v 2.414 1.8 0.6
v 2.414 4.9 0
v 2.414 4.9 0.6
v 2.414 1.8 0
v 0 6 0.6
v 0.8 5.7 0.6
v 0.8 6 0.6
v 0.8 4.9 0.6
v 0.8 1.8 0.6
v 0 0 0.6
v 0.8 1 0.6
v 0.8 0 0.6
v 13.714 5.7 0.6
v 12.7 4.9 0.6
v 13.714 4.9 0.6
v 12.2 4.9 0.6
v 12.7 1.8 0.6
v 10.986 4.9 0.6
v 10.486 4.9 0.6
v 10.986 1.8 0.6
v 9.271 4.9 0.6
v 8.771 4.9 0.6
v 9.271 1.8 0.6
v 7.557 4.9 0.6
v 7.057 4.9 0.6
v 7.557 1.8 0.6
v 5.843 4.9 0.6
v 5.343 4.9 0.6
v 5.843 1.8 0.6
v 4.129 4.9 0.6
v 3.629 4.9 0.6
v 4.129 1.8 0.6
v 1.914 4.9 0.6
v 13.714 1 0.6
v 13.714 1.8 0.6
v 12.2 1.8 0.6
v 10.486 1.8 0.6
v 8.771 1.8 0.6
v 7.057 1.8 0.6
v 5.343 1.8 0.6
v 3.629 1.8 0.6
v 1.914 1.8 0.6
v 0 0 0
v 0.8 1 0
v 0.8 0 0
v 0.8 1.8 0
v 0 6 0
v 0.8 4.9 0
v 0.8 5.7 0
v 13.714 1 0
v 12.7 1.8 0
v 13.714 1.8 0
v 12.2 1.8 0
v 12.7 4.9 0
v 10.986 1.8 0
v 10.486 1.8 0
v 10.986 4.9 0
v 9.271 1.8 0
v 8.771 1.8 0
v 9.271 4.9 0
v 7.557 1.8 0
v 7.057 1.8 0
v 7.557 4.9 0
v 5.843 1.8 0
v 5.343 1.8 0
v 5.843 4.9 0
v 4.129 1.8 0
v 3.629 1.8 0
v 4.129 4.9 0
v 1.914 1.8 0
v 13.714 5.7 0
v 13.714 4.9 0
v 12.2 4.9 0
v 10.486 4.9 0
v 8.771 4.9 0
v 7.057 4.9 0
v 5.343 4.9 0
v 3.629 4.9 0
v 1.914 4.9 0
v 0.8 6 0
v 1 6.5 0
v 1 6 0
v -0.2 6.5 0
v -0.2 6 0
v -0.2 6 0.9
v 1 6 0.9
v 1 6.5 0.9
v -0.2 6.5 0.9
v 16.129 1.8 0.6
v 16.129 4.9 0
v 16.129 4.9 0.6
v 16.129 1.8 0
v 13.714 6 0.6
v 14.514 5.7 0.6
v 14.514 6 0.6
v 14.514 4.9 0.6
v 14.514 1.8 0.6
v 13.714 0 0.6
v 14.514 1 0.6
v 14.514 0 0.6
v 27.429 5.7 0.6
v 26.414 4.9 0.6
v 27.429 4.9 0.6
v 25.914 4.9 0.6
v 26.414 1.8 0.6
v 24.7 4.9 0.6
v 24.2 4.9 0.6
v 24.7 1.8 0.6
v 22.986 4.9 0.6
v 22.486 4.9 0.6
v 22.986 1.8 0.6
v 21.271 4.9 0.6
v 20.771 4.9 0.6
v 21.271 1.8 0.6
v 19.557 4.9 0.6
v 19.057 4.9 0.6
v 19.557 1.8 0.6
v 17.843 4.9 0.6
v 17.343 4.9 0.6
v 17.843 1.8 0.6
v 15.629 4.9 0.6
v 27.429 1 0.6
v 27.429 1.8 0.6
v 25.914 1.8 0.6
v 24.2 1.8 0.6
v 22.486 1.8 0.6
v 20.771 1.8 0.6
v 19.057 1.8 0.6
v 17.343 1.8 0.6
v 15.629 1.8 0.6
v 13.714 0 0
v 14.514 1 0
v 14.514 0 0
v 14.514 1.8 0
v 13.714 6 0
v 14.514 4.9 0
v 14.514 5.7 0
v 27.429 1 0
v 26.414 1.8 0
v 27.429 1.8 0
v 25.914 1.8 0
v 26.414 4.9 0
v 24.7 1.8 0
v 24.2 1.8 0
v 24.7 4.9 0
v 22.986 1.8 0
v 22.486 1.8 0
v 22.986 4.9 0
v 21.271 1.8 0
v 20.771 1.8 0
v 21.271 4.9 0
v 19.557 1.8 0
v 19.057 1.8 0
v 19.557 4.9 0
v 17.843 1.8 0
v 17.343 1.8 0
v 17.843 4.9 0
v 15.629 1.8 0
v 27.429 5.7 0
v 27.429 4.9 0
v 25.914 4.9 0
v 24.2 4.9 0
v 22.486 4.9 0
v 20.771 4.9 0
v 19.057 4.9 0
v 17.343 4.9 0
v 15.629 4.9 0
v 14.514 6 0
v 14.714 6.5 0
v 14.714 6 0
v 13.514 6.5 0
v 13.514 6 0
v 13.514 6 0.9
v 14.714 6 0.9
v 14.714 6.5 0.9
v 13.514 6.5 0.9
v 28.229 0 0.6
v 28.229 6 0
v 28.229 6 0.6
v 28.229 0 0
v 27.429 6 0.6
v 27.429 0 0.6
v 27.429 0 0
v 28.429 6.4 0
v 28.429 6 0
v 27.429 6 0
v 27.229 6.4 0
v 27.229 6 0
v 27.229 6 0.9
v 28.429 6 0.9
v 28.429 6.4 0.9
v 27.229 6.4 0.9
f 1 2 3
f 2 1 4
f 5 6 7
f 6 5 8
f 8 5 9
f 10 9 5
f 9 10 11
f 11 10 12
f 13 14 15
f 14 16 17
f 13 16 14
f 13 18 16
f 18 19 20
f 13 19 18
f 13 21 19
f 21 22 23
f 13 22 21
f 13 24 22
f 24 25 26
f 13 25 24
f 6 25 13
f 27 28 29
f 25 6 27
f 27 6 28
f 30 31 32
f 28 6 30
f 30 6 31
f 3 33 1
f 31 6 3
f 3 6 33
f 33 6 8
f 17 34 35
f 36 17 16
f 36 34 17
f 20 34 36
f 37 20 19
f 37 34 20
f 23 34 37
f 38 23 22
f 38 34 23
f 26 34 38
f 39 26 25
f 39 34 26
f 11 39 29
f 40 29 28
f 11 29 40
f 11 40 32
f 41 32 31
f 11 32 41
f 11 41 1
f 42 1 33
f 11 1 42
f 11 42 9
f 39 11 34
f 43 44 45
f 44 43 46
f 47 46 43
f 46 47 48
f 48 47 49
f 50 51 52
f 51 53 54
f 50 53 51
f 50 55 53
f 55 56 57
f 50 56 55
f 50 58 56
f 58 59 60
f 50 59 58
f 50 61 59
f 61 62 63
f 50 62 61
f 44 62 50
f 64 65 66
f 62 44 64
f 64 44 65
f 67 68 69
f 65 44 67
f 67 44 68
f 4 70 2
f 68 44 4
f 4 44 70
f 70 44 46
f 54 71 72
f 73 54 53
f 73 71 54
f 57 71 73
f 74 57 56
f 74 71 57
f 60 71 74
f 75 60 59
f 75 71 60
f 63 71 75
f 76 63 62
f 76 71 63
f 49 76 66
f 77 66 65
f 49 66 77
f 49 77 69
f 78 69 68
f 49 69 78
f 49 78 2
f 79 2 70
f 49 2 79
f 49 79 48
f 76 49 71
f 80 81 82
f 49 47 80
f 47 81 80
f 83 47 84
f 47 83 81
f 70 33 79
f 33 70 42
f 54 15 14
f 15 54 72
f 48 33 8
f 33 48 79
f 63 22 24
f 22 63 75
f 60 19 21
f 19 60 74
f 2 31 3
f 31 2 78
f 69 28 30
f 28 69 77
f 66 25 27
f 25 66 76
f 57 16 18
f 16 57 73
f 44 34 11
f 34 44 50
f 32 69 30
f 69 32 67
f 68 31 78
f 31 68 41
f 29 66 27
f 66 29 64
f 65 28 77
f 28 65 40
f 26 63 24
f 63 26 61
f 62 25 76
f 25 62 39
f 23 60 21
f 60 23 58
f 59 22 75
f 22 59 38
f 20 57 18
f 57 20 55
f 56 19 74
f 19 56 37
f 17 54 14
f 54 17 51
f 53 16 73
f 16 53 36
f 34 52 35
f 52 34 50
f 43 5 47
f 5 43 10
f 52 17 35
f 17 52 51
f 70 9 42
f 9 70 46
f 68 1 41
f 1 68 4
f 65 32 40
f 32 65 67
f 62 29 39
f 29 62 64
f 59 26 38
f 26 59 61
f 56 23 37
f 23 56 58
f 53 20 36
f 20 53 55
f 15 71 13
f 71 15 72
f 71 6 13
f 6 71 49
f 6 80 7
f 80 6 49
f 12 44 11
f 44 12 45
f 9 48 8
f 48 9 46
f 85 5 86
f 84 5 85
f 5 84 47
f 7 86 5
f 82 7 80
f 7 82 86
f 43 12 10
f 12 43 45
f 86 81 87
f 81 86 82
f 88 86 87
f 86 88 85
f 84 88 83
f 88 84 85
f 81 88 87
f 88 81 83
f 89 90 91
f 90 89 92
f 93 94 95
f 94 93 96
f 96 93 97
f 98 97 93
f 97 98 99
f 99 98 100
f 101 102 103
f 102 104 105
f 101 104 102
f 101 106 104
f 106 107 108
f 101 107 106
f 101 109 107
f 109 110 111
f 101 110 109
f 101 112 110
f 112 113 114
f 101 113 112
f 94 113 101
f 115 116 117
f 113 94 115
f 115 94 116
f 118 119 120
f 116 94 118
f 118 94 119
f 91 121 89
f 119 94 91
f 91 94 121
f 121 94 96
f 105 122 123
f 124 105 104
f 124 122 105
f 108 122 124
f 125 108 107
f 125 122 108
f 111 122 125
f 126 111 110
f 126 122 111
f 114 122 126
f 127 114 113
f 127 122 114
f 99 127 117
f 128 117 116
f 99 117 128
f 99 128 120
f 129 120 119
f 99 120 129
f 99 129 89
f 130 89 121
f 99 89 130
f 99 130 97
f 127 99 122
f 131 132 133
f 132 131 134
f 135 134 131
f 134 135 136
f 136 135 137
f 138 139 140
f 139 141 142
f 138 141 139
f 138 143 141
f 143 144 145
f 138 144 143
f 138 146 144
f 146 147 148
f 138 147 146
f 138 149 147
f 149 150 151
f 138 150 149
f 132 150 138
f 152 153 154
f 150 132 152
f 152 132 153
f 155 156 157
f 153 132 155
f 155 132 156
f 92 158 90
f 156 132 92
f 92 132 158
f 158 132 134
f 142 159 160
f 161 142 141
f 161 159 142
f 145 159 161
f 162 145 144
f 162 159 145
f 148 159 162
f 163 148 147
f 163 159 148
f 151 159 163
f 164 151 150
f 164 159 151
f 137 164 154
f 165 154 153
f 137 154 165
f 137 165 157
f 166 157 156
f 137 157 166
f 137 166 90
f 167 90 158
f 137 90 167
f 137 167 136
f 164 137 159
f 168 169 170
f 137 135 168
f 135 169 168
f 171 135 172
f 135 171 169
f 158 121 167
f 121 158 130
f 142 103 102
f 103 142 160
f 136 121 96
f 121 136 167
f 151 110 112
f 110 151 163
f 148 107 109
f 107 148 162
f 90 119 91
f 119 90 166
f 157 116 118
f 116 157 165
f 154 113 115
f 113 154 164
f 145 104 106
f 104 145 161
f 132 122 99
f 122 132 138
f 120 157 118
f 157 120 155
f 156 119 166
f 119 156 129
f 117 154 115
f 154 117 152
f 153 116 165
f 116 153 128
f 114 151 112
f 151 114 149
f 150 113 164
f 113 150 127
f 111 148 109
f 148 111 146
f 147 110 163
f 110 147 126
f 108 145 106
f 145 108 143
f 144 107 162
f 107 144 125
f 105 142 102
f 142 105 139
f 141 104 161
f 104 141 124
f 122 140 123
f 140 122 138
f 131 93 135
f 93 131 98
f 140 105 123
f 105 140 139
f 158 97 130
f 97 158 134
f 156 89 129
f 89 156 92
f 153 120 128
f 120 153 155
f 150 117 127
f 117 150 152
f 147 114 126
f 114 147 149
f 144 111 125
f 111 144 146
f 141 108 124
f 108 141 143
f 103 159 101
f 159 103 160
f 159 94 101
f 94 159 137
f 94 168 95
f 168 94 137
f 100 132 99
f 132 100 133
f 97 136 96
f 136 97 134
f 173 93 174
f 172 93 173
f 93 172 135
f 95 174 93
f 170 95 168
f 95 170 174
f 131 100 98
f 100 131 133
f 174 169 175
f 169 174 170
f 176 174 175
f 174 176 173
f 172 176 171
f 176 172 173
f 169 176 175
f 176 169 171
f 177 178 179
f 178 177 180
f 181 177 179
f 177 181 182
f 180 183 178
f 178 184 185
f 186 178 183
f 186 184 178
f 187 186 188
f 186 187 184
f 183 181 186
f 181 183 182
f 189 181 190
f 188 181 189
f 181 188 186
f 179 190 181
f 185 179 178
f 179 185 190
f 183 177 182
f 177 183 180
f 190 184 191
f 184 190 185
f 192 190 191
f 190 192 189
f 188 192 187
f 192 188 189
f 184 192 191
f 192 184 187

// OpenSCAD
//
//	Customizable Fence for N Scale Model Railroads
//	Steve Medwin
//	April 12, 2014
// 
//  Derivative by Jonathan Sammon
//  Dec. 14, 2016

// preview[view:north, tilt:bottom]

Nslats=8*1;
width=0.8*1;
height=6*1;
depth=0.6*1;
spacing=1.5*8/7*1;
bar_depth=depth-0.2;
// How many fence sections?
number_sections=2; // [1:20]



module fence() {
// vertical slats
	for (i=[1:Nslats-1]){
		translate([i*spacing+width/4,1,0]) cube([.5,height-2.1,depth]);
		}

// horizontal bars
	translate([0,1,0]) cube([Nslats*spacing,width,depth]);
	translate([0,height-1.1,0]) cube([Nslats*spacing,width,depth]);

// vertical post
	translate([0,0,0]) cube([width,height,depth]);
    translate([-width*.25,height,0]) cube([width*1.5,.5,depth*1.5]);
}

// make fence
for (j=[0:number_sections-1]) {
	translate ([j*Nslats*spacing,0,0]) fence();
}

// end the row of fences
// vertical post
	translate([number_sections*Nslats*spacing,0,0]) cube([width,height,depth]);
    translate([-width*.25+number_sections*Nslats*spacing,height,0]) cube([width*1.5,width/2,depth*1.5]);
// horizontal bars
//	translate([number_sections*Nslats*spacing,1,depth]) cube([width,width,bar_depth]);
//	translate([number_sections*Nslats*spacing,height-1.1,depth]) cube([width,width,bar_depth]);
